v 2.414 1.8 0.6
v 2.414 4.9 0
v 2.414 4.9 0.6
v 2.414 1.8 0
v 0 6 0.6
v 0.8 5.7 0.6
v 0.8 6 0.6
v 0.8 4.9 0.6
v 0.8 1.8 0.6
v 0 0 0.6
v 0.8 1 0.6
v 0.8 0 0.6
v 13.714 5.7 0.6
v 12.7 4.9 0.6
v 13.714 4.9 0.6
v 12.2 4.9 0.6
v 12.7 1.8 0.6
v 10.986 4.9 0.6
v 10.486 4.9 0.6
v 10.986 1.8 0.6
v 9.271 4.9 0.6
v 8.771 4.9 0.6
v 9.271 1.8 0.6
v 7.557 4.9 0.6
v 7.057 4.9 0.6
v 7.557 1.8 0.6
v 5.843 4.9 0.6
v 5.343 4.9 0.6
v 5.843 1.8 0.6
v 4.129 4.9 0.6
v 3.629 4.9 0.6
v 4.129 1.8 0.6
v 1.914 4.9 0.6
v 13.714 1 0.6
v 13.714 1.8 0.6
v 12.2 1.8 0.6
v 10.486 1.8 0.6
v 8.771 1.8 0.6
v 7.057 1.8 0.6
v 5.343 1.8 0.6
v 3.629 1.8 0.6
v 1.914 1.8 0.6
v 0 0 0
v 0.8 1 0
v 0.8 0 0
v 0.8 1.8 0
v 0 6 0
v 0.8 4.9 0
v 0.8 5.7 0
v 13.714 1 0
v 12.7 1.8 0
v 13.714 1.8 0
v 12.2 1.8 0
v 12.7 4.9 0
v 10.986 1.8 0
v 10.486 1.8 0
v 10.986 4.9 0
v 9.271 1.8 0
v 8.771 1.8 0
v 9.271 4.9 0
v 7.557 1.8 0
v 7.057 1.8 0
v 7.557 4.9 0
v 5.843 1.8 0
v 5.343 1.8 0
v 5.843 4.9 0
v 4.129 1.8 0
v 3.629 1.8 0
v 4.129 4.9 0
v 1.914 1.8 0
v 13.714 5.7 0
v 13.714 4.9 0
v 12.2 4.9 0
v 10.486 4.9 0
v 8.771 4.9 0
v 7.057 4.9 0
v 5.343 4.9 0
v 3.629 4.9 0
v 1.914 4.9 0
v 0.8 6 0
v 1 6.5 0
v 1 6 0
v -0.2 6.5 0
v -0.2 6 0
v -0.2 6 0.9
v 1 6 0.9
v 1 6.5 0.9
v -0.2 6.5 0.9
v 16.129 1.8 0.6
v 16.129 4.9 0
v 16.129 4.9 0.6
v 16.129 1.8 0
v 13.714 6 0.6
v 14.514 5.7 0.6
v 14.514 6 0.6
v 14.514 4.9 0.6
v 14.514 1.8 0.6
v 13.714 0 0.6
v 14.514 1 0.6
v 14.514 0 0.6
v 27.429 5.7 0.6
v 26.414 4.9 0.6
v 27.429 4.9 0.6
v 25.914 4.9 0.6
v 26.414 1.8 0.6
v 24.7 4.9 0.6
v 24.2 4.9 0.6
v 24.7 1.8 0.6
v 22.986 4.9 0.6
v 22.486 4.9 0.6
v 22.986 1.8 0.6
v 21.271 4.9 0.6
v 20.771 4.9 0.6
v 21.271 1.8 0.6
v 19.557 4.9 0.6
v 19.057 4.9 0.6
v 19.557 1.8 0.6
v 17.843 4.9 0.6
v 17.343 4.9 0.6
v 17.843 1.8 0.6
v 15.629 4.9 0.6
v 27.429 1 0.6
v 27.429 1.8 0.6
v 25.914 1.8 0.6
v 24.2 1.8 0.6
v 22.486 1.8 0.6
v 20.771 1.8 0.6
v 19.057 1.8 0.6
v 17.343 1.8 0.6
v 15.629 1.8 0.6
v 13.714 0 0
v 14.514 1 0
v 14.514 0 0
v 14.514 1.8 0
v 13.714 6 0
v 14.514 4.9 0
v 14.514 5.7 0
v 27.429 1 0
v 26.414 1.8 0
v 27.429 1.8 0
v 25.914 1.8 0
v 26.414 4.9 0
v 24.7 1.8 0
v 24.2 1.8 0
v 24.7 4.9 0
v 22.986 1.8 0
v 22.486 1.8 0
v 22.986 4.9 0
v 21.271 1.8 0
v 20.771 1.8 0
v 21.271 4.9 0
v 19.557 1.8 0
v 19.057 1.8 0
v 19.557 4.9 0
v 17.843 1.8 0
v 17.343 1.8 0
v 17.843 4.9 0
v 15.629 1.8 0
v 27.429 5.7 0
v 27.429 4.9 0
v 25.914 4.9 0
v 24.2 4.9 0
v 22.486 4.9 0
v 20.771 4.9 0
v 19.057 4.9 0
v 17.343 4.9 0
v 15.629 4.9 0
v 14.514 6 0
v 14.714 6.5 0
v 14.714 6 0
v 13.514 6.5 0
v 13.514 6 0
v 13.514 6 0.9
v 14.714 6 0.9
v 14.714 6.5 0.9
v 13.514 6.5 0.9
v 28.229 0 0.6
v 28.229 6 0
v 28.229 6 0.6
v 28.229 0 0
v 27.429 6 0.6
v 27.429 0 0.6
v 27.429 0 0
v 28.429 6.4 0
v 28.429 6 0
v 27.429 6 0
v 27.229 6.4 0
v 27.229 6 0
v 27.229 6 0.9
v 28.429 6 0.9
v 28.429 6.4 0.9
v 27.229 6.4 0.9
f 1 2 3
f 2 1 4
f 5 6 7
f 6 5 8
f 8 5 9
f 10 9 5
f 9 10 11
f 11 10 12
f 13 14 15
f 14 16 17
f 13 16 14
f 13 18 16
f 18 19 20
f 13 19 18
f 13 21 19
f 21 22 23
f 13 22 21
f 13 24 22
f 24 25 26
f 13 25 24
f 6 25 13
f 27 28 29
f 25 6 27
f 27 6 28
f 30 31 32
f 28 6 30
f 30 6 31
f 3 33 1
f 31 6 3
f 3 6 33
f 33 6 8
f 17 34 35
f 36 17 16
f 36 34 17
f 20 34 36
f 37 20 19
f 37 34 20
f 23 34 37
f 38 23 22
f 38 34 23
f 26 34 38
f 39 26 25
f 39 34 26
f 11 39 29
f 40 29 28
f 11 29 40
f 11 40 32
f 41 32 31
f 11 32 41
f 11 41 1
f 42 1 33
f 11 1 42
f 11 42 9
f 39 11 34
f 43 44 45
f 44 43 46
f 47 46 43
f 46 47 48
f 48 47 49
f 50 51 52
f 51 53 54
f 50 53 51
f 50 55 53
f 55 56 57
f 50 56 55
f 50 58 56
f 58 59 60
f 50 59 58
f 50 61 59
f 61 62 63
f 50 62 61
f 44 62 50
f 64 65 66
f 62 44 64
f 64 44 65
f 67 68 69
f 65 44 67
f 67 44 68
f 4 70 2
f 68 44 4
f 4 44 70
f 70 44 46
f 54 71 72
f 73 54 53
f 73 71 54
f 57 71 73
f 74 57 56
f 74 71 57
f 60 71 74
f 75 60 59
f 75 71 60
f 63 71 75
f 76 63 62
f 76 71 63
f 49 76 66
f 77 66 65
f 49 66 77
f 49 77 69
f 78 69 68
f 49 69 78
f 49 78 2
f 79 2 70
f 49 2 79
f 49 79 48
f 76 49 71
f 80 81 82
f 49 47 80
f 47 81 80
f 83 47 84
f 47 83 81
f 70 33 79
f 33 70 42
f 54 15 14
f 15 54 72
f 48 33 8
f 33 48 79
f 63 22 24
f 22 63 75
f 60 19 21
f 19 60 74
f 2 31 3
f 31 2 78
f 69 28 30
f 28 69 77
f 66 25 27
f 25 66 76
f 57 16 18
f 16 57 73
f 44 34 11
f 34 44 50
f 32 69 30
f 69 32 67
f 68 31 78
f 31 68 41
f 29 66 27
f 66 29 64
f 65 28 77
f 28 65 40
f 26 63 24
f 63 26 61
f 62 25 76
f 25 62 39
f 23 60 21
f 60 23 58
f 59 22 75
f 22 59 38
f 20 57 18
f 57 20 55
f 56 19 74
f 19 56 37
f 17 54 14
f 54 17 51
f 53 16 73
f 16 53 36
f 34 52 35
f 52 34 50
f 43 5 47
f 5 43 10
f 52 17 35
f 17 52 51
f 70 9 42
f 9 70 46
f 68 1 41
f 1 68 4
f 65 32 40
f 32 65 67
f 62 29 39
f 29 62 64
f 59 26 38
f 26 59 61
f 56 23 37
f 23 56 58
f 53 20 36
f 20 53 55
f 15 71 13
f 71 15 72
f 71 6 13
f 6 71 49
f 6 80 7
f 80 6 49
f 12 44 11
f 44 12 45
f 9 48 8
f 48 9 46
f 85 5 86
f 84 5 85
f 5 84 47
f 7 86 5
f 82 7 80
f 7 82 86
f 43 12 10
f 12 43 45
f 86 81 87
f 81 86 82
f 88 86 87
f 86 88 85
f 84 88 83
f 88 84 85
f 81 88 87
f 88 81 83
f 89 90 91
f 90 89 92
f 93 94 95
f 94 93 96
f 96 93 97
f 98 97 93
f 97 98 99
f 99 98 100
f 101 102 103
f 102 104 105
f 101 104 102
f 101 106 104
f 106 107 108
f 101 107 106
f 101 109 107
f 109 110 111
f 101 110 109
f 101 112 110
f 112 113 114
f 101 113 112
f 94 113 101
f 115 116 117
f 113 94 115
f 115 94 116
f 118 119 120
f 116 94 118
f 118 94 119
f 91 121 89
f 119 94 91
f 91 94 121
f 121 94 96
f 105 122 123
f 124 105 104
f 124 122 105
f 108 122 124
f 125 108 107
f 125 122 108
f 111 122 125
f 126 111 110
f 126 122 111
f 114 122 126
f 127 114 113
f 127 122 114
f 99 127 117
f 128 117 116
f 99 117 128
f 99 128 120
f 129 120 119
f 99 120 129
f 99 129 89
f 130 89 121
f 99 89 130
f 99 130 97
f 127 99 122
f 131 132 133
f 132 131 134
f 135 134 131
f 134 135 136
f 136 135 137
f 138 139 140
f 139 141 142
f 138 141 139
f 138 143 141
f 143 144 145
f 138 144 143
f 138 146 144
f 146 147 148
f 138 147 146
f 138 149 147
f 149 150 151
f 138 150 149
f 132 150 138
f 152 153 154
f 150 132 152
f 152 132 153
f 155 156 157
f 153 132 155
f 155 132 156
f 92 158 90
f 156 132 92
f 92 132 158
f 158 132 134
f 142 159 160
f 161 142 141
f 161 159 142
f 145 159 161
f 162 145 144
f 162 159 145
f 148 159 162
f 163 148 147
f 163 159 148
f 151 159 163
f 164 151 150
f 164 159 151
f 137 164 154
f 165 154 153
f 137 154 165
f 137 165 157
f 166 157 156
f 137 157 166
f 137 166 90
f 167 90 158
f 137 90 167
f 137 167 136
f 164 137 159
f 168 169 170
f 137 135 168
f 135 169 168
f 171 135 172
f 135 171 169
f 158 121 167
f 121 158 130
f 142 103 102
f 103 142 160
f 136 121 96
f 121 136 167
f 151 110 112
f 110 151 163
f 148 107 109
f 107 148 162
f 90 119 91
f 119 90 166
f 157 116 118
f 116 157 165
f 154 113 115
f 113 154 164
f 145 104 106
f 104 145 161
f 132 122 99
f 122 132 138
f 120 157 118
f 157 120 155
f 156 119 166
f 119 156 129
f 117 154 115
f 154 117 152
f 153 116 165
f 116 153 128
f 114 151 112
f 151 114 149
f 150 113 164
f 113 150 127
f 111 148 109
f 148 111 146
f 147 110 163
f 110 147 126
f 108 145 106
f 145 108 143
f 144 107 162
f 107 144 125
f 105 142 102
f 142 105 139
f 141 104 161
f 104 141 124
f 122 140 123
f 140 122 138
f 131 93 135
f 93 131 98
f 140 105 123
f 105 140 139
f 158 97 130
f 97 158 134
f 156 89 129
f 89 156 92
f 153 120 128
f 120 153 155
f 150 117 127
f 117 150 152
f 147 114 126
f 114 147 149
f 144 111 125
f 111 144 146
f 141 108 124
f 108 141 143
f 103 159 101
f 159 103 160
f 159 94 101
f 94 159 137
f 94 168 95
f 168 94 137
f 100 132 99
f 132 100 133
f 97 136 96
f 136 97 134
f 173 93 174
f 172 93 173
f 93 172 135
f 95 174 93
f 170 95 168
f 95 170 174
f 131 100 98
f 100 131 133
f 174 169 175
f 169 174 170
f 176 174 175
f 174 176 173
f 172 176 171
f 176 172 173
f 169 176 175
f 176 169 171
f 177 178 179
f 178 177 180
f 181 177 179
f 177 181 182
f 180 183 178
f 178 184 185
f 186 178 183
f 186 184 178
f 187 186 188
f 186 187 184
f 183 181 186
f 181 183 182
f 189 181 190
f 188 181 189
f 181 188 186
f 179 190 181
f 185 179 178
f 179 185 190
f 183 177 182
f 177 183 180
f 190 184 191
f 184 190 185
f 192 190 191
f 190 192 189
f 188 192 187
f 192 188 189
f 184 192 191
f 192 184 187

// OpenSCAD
//
//	Customizable Fence for N Scale Model Railroads
//	Steve Medwin
//	April 12, 2014
// 
//  Derivative by Jonathan Sammon
//  Dec. 14, 2016

// preview[view:north, tilt:bottom]

Nslats=8*1;
width=0.8*1;
height=6*1;
depth=0.6*1;
spacing=1.5*8/7*1;
bar_depth=depth-0.2;
// How many fence sections?
number_sections=2; // [1:20]



module fence() {
// vertical slats
	for (i=[1:Nslats-1]){
		translate([i*spacing+width/4,1,0]) cube([.5,height-2.1,depth]);
		}

// horizontal bars
	translate([0,1,0]) cube([Nslats*spacing,width,depth]);
	translate([0,height-1.1,0]) cube([Nslats*spacing,width,depth]);

// vertical post
	translate([0,0,0]) cube([width,height,depth]);
    translate([-width*.25,height,0]) cube([width*1.5,.5,depth*1.5]);
}

// make fence
for (j=[0:number_sections-1]) {
	translate ([j*Nslats*spacing,0,0]) fence();
}

// end the row of fences
// vertical post
	translate([number_sections*Nslats*spacing,0,0]) cube([width,height,depth]);
    translate([-width*.25+number_sections*Nslats*spacing,height,0]) cube([width*1.5,width/2,depth*1.5]);
// horizontal bars
//	translate([number_sections*Nslats*spacing,1,depth]) cube([width,width,bar_depth]);
//	translate([number_sections*Nslats*spacing,height-1.1,depth]) cube([width,width,bar_depth]);
